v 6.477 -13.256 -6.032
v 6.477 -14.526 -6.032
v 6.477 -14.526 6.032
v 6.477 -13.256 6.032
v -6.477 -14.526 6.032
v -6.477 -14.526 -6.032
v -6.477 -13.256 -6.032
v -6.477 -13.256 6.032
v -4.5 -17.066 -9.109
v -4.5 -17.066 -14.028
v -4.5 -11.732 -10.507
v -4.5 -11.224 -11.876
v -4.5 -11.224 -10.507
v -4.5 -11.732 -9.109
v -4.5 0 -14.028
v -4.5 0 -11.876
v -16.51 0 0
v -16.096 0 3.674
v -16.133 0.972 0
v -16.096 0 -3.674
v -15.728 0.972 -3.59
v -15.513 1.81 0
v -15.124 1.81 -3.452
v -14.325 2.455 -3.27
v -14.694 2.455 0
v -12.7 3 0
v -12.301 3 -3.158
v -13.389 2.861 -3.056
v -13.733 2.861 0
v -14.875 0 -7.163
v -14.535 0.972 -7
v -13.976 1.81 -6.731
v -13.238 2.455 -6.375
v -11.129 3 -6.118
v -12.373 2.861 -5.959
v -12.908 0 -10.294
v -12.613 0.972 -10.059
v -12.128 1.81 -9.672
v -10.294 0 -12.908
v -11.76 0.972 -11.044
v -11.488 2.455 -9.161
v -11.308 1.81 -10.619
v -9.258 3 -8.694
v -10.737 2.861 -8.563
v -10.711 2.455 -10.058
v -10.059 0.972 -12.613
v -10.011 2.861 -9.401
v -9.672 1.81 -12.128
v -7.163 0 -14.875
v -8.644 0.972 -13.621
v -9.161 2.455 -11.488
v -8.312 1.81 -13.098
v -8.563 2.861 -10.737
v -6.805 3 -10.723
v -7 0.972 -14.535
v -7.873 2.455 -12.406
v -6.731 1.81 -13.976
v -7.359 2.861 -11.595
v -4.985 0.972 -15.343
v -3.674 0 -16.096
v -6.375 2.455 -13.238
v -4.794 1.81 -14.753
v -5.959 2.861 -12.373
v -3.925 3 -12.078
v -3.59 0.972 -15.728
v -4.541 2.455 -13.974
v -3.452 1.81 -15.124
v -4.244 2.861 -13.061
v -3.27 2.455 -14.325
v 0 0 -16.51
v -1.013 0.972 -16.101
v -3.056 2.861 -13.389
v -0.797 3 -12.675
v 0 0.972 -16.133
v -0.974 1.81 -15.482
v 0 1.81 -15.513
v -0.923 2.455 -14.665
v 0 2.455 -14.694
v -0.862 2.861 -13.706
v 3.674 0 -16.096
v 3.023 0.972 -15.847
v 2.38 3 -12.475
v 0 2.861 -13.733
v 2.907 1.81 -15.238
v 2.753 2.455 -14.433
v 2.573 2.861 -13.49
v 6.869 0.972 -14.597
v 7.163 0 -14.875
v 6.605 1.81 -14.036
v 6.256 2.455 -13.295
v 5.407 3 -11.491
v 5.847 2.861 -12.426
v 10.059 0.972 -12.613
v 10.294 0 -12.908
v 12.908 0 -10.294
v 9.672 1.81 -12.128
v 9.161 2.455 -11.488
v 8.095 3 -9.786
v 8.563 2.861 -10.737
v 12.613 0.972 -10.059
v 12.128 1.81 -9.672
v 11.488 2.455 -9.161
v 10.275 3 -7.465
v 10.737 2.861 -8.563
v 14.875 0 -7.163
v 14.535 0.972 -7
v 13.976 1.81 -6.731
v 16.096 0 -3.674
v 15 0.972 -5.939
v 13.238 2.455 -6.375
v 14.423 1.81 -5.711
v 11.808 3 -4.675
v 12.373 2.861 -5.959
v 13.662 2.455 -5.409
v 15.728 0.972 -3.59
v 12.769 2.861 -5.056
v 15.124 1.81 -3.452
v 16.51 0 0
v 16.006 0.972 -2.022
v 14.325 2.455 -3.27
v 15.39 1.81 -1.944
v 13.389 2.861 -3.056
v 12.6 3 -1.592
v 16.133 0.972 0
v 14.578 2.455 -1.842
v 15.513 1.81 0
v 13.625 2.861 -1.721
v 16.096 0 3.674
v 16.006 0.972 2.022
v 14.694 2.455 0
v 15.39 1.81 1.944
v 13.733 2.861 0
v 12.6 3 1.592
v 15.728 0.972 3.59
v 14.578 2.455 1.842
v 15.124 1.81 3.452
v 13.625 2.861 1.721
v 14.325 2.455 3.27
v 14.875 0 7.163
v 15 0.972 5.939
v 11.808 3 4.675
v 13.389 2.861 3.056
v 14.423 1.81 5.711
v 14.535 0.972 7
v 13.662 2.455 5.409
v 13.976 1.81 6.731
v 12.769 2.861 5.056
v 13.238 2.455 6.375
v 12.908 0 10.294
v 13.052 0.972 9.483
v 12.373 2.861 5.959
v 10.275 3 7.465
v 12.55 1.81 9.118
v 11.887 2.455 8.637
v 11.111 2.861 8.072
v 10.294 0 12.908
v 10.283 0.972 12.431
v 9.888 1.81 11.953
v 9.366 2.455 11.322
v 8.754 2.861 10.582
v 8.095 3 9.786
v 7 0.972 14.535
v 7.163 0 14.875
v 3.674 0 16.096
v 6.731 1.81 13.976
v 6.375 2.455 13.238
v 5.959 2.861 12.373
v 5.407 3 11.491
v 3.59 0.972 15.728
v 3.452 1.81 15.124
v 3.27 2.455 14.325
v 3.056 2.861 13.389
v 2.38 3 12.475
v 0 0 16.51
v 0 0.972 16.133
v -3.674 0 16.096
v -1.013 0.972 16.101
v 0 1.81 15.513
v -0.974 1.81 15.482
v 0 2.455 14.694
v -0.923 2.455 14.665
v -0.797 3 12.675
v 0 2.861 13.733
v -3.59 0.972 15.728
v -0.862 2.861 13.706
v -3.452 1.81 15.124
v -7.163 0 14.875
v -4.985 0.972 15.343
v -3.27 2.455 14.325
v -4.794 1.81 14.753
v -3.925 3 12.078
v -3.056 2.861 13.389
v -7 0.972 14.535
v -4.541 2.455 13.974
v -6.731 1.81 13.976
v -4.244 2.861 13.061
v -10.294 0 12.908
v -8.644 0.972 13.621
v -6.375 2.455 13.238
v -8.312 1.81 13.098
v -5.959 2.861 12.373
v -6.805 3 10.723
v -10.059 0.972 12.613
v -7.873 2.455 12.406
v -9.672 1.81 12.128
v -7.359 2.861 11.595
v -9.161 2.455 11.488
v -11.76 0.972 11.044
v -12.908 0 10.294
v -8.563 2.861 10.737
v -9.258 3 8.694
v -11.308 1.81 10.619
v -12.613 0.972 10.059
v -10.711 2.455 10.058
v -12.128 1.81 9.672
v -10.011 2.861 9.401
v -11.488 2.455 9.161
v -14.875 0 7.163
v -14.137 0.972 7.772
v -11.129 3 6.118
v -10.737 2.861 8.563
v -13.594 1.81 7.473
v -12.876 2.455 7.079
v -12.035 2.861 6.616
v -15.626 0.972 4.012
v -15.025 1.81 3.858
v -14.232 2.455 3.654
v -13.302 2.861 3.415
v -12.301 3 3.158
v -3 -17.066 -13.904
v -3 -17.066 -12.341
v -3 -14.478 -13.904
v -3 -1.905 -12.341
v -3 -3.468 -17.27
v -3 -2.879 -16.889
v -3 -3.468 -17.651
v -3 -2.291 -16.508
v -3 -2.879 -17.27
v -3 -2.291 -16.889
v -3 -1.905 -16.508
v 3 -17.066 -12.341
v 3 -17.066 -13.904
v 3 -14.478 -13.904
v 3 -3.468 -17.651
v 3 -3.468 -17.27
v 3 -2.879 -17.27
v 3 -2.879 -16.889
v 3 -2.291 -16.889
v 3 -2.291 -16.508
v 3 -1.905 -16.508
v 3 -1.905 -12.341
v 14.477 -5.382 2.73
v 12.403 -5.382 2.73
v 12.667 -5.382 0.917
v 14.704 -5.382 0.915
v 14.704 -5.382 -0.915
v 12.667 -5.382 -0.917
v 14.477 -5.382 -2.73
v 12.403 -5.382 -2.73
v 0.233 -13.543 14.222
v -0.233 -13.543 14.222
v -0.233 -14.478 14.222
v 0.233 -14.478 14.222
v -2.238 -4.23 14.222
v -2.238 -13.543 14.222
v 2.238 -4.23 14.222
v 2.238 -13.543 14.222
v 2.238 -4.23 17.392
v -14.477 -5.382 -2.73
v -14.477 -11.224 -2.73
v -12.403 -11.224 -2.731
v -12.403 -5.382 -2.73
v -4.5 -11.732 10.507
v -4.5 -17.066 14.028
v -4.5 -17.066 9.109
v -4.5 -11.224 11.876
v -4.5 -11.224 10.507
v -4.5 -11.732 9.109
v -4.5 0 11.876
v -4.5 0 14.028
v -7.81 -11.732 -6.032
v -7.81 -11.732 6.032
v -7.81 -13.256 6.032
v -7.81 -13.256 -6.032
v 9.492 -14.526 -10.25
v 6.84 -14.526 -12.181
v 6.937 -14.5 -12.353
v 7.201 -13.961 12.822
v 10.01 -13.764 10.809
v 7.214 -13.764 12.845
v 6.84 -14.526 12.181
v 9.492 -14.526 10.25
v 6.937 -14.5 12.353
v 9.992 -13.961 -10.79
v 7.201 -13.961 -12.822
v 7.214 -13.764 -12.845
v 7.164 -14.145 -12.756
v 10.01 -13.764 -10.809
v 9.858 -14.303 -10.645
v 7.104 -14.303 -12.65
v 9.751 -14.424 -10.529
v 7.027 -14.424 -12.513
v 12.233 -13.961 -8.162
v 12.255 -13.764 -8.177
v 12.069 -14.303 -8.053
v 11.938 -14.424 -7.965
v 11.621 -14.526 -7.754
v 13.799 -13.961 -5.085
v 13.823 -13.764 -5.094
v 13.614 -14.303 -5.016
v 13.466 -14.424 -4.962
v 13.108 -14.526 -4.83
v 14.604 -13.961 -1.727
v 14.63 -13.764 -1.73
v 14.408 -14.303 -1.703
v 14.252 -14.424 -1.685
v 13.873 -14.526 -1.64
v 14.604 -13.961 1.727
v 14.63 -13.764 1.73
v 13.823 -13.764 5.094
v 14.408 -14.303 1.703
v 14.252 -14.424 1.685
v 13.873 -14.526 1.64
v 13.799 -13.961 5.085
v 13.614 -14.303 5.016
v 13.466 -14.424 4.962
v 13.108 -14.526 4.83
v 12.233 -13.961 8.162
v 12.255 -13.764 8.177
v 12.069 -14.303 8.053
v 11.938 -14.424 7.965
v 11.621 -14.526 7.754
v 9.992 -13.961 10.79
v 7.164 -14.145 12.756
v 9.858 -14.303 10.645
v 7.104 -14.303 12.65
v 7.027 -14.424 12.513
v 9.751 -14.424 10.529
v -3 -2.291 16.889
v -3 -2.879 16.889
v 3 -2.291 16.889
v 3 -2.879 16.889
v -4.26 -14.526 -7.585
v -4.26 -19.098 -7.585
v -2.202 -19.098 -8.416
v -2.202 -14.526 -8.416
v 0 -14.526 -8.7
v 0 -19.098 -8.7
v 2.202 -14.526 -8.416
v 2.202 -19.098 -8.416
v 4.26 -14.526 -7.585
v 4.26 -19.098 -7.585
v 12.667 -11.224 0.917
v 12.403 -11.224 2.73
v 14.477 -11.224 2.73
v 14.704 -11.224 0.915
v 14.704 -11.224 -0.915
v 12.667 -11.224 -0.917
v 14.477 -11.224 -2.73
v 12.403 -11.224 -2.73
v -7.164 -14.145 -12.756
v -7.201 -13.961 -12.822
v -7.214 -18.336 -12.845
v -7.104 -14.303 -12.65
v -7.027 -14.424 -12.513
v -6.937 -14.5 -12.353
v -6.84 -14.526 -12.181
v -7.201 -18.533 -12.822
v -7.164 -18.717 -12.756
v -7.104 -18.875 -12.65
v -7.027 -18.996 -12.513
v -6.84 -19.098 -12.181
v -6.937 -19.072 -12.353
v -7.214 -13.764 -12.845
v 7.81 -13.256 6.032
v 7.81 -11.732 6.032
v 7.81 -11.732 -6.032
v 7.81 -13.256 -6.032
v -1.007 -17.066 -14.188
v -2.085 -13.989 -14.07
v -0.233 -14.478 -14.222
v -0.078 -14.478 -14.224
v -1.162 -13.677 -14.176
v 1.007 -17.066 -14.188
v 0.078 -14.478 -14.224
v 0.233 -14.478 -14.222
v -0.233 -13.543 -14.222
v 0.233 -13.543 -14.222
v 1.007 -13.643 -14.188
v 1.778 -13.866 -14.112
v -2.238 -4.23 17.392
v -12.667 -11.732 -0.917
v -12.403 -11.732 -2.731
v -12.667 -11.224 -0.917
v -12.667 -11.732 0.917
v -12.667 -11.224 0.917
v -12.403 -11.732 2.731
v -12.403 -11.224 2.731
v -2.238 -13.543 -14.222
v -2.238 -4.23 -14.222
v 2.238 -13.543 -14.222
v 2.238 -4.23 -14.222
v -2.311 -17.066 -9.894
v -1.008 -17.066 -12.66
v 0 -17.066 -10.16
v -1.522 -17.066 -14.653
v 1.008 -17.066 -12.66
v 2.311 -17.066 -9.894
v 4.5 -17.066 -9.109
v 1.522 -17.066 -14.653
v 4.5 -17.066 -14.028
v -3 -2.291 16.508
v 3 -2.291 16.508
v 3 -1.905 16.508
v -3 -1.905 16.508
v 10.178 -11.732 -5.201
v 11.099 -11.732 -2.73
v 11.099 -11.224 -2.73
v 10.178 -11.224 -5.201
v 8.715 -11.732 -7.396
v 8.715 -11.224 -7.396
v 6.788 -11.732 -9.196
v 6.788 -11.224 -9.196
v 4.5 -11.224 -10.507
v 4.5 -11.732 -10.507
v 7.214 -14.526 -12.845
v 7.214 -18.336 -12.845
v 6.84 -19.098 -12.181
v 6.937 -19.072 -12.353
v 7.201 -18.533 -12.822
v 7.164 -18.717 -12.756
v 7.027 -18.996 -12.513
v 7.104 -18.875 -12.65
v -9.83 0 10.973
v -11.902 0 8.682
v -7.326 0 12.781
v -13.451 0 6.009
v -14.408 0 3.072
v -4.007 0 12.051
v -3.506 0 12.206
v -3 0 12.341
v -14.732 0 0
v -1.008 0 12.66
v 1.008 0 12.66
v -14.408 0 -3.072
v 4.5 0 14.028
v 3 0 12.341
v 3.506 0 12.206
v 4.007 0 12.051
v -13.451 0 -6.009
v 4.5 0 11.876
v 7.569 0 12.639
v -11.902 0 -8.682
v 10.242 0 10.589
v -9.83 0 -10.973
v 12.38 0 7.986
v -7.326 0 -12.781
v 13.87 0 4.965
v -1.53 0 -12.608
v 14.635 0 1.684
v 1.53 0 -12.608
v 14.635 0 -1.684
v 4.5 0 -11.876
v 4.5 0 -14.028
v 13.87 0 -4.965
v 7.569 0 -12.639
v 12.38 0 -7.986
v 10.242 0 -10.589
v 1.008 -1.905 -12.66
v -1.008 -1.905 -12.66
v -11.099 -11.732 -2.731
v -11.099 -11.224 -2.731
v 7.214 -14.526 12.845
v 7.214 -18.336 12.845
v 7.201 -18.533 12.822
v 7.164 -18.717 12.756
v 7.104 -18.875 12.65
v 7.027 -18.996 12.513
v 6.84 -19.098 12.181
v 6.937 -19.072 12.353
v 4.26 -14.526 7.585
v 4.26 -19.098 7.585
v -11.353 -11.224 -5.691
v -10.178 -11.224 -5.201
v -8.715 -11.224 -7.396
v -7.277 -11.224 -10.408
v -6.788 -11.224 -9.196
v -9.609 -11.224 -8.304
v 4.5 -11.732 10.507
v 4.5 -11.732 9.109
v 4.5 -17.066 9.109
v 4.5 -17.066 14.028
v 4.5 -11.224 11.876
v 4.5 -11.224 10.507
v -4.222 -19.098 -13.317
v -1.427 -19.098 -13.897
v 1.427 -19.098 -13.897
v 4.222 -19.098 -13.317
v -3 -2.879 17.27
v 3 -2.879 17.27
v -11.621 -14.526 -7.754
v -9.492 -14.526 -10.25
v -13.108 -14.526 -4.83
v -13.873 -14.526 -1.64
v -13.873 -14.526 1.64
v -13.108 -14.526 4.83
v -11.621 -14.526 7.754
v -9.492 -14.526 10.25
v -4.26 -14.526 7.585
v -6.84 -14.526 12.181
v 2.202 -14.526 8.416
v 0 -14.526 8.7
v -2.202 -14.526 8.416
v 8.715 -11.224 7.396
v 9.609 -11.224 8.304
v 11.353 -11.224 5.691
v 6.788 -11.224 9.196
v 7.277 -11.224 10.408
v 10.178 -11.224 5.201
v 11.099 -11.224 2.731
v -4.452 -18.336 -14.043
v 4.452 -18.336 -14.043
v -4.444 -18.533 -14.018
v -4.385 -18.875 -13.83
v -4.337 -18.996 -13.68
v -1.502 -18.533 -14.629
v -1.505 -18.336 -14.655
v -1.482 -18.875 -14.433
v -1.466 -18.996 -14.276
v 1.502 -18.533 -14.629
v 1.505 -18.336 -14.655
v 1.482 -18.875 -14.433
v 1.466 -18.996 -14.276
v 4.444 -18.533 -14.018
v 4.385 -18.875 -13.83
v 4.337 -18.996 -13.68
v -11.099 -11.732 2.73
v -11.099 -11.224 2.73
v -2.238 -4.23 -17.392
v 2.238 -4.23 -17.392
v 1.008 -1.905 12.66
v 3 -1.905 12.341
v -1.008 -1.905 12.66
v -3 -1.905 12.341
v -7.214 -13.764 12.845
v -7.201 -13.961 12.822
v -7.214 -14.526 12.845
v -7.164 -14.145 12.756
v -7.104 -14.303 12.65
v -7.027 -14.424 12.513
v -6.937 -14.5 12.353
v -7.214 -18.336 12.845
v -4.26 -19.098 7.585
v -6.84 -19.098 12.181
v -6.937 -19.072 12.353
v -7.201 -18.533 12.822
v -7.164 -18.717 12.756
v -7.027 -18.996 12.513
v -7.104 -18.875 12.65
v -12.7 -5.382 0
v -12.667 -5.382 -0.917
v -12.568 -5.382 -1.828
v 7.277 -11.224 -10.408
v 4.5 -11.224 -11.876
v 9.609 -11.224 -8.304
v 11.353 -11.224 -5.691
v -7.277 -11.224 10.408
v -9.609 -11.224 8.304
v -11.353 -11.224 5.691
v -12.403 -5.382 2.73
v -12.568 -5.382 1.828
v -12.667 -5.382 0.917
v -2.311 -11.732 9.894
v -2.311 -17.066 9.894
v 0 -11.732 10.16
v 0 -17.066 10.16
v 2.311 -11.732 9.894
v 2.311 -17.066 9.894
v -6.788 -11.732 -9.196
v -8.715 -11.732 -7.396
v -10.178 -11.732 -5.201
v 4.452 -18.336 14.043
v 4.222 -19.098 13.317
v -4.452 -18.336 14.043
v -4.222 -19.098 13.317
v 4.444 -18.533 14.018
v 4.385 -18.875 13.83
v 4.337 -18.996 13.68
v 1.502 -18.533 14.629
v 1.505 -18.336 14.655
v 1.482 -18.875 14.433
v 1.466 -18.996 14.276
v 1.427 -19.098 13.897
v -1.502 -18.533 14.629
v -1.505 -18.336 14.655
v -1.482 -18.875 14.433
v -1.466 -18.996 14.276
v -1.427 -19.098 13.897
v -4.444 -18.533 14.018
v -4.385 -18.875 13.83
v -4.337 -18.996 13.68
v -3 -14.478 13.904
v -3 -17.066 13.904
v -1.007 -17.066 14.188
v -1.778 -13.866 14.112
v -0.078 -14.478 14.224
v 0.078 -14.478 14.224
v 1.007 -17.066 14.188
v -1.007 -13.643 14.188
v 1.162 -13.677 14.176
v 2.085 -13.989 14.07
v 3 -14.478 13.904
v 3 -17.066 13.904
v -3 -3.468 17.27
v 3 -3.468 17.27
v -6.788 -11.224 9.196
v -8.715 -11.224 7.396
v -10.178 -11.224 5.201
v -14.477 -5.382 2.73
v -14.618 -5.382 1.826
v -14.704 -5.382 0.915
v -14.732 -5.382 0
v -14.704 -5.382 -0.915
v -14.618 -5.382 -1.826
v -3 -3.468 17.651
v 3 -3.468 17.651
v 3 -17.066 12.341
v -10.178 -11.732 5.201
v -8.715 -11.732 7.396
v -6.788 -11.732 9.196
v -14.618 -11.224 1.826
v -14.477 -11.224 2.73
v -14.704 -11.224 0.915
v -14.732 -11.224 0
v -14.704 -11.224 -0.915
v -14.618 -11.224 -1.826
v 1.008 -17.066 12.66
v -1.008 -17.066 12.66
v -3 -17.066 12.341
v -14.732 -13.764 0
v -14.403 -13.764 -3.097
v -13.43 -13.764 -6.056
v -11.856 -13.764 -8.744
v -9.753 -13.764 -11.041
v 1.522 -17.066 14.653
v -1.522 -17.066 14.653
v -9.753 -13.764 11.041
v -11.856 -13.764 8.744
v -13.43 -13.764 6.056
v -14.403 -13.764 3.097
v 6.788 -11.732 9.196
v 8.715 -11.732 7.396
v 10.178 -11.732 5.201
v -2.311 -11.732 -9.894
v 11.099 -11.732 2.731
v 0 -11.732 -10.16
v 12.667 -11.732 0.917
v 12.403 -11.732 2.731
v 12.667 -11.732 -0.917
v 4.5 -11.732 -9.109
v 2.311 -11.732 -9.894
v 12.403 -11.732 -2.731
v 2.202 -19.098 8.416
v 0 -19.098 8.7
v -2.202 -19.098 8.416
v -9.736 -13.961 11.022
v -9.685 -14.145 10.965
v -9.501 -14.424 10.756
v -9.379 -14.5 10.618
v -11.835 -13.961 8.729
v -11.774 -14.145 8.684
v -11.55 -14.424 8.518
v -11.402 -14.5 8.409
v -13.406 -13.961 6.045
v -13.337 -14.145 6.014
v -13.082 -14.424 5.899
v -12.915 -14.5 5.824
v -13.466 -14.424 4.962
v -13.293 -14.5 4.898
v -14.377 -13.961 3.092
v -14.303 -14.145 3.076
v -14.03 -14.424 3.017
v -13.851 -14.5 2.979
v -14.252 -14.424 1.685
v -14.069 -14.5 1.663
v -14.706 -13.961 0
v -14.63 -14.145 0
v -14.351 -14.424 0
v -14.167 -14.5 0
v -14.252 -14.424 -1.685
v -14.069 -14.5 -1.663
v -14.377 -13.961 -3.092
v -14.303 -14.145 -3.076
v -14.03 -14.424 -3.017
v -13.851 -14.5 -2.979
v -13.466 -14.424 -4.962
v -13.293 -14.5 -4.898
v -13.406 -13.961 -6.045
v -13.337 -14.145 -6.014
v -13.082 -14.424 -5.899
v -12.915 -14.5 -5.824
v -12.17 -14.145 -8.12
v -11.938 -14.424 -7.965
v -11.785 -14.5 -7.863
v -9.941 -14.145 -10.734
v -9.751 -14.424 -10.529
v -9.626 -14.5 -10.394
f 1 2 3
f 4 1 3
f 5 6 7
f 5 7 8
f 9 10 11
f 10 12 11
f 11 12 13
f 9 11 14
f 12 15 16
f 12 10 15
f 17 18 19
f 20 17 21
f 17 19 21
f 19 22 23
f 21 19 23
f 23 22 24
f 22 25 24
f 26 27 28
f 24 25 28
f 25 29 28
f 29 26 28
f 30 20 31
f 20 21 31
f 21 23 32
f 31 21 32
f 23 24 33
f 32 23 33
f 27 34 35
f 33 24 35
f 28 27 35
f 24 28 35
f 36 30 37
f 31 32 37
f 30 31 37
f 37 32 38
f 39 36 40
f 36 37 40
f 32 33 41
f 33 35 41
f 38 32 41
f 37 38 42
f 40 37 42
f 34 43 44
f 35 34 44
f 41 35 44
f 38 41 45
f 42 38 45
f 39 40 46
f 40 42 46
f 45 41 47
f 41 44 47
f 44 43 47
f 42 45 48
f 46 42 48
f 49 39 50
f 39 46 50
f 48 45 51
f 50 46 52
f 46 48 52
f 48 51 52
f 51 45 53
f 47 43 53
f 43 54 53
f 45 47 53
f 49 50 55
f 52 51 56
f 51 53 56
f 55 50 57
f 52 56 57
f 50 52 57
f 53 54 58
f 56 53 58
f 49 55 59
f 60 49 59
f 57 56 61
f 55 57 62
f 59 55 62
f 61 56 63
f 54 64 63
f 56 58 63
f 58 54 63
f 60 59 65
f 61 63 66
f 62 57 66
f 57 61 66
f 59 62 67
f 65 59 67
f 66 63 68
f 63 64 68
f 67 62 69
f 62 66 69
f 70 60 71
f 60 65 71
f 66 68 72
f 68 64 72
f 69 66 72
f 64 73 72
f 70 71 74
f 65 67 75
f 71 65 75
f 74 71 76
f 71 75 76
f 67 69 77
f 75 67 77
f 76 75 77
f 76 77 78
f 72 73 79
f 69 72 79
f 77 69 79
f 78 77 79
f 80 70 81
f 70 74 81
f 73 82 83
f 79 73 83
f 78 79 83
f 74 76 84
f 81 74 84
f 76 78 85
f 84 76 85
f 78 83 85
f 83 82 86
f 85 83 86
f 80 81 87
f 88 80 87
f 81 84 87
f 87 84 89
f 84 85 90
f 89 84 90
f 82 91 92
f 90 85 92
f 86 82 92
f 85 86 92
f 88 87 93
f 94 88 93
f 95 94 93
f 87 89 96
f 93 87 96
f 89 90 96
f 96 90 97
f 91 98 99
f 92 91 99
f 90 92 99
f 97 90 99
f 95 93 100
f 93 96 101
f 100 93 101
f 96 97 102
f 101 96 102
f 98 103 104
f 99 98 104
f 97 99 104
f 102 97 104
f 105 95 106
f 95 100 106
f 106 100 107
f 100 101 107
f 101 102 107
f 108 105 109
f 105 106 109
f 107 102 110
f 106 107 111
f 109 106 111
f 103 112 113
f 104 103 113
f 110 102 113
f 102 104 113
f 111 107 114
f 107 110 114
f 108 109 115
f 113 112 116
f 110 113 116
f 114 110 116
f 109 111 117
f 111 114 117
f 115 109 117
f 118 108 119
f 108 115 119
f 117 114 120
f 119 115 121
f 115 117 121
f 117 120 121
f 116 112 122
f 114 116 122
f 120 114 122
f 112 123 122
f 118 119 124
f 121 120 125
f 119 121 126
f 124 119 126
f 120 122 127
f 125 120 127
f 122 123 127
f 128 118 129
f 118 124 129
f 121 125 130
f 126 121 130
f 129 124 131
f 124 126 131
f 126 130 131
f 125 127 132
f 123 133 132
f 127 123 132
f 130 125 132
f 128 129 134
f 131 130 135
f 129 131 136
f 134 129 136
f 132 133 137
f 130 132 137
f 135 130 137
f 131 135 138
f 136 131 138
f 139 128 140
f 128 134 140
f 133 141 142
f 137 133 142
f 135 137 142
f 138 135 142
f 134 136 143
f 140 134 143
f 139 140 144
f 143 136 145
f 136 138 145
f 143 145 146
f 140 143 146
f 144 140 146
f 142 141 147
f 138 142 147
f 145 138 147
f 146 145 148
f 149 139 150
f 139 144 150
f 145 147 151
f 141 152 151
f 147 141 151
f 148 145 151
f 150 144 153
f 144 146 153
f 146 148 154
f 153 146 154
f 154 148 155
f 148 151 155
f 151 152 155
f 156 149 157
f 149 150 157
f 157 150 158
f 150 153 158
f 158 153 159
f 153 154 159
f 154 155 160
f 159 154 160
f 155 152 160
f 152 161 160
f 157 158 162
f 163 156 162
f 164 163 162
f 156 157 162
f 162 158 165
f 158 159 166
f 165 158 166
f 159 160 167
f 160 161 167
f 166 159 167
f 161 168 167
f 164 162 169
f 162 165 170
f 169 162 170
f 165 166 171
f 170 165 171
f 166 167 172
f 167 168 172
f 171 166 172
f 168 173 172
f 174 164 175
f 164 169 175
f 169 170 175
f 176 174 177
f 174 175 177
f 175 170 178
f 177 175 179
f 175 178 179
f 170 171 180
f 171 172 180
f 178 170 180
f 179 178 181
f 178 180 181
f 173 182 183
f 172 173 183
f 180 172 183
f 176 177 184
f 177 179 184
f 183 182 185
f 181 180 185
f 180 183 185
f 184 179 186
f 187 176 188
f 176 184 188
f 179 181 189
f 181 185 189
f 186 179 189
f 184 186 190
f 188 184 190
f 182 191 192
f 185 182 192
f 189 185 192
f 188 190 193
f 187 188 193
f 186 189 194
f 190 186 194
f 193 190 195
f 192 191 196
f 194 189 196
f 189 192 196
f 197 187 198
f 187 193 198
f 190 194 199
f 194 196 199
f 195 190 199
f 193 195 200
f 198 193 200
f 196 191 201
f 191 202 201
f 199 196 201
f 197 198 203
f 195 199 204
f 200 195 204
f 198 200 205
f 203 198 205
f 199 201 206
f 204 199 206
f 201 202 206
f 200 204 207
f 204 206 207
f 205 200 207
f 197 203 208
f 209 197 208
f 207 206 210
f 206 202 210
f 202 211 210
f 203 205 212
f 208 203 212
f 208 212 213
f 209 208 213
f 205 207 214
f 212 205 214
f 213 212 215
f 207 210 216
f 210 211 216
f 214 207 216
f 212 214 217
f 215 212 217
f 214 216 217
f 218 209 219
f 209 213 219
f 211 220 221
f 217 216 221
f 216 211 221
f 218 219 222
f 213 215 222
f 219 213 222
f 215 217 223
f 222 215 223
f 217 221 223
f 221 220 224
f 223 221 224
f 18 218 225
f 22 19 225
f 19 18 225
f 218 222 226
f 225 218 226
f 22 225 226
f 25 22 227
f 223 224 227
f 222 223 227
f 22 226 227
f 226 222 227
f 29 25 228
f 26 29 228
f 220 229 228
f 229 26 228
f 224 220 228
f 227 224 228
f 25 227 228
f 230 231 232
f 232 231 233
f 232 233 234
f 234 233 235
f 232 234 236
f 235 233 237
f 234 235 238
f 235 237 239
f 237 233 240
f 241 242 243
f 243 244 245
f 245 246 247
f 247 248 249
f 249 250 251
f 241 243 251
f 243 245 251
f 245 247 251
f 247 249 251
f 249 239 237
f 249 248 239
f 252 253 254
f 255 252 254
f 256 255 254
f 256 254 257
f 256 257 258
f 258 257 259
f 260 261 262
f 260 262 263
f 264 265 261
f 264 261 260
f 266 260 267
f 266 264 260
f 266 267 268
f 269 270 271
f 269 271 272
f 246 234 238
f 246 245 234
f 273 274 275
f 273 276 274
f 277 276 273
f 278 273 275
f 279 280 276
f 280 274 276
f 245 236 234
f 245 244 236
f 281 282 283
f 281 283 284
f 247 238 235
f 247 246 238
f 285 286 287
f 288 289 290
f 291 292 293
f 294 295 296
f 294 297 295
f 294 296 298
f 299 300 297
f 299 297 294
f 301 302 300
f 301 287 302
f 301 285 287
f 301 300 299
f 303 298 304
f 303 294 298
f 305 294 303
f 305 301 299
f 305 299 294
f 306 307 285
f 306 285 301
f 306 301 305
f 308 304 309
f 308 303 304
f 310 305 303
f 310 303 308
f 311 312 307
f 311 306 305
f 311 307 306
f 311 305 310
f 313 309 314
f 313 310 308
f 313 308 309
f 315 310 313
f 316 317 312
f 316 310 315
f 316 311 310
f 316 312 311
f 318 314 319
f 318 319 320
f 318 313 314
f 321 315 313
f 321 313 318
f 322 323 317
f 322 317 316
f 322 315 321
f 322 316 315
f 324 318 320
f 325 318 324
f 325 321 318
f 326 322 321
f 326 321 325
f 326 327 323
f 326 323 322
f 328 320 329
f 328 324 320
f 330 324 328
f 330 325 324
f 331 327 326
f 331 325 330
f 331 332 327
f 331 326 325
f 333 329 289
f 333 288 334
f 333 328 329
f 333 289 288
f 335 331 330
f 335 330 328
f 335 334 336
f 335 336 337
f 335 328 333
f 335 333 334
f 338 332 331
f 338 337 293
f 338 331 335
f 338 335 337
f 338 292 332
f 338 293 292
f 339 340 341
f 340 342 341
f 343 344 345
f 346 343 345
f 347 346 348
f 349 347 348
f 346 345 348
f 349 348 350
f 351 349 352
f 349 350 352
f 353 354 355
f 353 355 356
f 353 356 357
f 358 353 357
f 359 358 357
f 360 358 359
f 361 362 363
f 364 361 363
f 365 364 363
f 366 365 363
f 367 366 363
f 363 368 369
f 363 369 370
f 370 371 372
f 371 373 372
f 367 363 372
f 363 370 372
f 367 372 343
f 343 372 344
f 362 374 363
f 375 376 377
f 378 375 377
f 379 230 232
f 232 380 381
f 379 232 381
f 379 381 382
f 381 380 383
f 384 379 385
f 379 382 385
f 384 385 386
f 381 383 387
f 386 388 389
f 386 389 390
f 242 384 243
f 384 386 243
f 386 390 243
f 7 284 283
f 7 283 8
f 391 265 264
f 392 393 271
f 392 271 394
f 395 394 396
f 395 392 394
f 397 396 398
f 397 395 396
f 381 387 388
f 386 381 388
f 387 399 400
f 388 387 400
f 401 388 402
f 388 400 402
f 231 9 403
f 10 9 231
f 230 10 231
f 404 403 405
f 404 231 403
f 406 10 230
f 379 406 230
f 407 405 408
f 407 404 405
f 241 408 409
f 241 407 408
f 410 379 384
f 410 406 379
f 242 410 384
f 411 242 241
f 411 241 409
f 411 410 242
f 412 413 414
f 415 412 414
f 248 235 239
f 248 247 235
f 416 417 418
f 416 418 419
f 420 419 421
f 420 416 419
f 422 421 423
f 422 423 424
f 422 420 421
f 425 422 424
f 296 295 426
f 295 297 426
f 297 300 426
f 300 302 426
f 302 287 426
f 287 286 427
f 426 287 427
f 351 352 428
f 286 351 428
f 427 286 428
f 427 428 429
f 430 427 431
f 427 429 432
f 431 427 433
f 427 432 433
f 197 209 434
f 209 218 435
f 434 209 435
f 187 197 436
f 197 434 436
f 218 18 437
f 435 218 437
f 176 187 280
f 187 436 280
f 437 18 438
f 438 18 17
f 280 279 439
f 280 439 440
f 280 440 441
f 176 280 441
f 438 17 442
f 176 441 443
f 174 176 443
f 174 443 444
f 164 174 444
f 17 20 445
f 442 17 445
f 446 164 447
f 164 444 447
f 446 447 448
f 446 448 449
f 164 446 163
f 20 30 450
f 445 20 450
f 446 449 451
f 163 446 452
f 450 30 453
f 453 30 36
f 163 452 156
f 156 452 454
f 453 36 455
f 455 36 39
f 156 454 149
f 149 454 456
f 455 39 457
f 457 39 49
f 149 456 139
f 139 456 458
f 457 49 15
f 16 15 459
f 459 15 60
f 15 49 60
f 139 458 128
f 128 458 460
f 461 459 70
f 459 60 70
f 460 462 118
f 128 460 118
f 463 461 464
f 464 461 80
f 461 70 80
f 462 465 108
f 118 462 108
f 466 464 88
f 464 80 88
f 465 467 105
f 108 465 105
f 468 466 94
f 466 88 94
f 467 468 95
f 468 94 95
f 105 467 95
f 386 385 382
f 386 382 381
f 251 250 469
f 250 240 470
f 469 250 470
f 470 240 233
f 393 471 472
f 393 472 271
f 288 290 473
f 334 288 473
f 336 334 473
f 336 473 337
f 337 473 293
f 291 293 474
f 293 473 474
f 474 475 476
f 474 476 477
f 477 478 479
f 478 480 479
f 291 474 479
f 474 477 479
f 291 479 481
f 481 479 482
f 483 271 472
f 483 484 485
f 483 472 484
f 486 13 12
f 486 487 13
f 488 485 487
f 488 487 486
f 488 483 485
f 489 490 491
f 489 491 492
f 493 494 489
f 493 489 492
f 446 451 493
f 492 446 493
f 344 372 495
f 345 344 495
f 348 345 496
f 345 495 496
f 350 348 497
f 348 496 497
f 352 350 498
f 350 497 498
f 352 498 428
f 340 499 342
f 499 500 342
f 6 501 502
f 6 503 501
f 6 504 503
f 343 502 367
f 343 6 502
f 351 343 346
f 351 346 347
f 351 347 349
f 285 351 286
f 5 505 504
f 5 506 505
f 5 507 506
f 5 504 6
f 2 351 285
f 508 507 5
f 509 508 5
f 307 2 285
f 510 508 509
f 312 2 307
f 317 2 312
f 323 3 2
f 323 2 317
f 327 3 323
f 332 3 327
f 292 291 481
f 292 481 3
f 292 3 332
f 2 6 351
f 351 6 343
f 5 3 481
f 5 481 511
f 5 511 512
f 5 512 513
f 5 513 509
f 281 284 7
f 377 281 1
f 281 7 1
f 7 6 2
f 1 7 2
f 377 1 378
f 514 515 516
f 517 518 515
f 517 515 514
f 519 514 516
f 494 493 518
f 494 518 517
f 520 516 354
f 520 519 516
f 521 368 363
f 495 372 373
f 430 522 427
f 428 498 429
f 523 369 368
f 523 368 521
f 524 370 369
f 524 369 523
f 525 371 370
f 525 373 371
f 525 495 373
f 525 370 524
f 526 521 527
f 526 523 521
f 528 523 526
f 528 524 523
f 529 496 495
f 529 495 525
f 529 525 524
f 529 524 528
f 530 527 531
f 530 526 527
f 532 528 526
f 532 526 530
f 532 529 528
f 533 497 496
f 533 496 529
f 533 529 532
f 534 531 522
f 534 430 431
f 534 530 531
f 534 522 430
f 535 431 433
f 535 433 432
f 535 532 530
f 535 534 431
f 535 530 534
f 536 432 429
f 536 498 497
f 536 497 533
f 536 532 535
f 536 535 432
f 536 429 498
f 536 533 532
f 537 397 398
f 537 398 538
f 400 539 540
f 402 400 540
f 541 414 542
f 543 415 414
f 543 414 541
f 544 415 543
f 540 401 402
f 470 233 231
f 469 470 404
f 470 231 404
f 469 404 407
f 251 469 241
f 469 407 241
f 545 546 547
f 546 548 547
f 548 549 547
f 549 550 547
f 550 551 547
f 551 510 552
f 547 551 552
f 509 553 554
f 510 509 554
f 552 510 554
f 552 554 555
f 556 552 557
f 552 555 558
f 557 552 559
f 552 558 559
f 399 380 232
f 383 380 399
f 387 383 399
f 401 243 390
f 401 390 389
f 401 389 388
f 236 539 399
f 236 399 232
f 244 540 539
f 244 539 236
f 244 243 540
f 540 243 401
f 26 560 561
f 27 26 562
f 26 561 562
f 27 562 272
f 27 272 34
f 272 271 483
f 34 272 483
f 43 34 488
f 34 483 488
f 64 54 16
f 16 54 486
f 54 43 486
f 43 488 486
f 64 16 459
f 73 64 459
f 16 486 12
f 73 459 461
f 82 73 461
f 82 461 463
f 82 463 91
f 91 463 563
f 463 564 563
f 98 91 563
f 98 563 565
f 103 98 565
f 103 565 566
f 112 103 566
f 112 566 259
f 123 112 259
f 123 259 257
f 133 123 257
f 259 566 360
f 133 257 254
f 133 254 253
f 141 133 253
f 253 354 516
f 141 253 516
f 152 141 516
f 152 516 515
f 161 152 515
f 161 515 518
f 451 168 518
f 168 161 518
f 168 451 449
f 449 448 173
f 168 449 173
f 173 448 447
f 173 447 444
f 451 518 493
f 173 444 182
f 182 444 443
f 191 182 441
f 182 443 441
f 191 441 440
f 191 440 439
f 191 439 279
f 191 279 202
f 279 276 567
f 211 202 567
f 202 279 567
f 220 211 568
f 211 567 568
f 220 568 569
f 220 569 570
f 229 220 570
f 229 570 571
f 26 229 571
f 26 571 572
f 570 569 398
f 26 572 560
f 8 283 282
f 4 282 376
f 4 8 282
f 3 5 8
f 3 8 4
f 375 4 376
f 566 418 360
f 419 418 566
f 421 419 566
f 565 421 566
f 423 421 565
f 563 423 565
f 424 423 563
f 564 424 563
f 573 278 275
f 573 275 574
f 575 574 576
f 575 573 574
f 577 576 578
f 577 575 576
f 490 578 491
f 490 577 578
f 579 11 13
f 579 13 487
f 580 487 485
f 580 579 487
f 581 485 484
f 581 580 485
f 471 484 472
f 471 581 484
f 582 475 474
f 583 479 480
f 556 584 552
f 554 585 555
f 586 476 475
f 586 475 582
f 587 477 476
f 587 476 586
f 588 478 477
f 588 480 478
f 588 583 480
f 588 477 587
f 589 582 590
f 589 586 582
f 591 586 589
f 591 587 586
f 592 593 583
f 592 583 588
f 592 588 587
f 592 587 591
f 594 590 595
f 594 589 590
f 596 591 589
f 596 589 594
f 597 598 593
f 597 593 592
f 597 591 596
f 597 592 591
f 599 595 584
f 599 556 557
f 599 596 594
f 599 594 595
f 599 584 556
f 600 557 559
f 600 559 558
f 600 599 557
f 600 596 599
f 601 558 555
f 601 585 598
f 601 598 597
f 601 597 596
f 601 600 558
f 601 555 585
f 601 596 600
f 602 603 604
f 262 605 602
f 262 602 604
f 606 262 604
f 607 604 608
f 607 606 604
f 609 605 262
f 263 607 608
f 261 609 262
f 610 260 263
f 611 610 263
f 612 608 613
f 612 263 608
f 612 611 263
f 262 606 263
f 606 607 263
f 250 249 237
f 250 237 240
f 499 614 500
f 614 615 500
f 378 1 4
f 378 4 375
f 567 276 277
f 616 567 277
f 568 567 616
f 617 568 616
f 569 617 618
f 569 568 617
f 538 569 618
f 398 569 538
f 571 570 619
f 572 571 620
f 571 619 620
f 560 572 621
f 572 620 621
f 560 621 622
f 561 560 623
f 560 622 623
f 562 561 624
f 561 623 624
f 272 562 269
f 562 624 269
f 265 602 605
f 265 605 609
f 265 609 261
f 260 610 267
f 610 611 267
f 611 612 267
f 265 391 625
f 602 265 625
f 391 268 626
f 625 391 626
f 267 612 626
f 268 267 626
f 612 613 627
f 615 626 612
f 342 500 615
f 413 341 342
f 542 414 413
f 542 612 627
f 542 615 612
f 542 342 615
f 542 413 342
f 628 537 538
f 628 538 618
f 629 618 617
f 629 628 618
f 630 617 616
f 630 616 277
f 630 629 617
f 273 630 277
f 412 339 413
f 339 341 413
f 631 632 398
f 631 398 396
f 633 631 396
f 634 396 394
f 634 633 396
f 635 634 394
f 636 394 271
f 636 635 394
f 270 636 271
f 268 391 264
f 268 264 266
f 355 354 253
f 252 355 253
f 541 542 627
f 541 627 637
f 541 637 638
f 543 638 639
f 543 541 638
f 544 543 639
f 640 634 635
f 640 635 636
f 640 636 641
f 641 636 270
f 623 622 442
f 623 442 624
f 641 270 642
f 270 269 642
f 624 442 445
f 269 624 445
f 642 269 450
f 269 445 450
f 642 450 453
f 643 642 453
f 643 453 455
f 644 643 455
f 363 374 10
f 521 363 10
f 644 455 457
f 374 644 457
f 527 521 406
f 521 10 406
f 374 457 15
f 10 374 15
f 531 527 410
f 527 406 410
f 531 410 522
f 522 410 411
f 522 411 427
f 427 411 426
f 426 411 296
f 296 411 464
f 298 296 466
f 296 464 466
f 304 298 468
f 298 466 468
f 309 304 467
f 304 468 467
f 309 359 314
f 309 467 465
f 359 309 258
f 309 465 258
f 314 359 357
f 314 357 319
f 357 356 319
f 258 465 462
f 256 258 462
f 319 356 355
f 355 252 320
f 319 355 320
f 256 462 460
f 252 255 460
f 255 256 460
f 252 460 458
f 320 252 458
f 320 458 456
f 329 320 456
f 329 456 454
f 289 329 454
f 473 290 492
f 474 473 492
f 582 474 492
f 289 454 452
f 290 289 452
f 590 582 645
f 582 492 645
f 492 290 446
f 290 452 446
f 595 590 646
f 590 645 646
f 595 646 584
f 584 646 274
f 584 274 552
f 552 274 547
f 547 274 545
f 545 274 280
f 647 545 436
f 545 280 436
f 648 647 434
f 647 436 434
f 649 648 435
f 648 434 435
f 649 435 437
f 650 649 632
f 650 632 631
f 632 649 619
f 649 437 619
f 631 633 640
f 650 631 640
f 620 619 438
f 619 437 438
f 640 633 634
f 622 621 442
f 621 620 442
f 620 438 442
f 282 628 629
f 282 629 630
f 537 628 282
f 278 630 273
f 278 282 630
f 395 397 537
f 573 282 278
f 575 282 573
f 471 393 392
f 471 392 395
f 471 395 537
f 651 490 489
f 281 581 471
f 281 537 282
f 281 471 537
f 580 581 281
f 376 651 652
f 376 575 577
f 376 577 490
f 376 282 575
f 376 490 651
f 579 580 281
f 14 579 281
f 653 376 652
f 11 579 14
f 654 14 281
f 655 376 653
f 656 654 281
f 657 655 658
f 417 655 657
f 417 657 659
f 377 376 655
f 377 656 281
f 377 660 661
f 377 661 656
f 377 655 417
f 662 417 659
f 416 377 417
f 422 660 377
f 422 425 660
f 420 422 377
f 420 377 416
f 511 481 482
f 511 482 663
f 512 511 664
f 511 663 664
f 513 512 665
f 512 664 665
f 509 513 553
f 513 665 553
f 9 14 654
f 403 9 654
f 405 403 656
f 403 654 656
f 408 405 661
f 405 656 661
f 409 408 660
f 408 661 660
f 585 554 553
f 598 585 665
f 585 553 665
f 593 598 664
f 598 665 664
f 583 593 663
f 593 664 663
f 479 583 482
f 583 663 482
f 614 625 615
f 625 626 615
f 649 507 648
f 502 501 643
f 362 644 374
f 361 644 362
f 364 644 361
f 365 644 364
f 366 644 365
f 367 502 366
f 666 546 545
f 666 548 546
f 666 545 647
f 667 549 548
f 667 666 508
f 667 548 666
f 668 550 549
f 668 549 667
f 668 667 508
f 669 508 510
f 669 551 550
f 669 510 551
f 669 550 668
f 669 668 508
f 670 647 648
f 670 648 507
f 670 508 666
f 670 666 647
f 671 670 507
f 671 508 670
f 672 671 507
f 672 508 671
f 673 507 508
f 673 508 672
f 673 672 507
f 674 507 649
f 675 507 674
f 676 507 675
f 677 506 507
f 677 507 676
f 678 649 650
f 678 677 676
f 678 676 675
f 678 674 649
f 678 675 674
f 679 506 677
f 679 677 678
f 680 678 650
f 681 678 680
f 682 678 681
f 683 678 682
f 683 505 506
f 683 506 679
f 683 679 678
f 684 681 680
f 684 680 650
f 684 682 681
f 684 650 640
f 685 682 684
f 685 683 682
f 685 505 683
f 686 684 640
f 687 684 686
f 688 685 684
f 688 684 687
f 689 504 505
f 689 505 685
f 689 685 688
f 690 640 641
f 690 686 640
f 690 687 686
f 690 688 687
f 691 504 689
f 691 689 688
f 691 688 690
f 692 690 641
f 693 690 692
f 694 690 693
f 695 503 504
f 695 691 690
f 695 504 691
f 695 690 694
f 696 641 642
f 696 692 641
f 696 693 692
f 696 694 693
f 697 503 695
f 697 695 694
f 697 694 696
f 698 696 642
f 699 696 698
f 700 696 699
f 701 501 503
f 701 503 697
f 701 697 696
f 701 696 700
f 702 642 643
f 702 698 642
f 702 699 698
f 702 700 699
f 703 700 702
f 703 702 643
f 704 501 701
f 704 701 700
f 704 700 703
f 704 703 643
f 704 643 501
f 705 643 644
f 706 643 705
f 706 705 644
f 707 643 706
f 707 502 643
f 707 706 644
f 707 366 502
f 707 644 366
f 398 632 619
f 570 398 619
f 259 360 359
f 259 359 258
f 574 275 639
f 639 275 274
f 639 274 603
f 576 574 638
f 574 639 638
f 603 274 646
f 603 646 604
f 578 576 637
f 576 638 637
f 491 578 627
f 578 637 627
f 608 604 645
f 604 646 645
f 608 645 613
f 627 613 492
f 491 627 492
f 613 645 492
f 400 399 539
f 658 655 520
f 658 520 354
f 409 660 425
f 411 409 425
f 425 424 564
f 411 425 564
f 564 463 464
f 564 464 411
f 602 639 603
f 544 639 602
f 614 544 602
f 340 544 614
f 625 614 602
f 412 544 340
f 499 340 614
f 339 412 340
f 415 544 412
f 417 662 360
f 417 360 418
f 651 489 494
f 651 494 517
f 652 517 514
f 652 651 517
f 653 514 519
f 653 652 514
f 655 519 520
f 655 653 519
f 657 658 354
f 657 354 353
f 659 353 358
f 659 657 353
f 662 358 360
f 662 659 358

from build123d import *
from build123d.topology import SkipClean

# Parameters (mm, degrees)
FEET_DEPTH            = 4.572
SWITCH_HOLE_REACH     = 31.195
SKETCH2_W             = 12.954
SKETCH2_H             = 12.065
SQUARE_DEPTH          = 31.164446025
SQUARE_DEPTH_BACK     = 31.164446025
SKETCH6_W             = 5.461
SKETCH6_H             = 5.842
EXTRUDE3_START        = -0.508
SKETCH4_W             = 12.954
SKETCH4_H             = 12.065
EXTRUDE3_DEPTH        = 0.508
SKETCH5_W             = 15.621
SKETCH5_H             = 12.065
SWITCH_HOLE2_DEPTH    = 1.524
TAB_CIRC_CUTOUT_DEPTH = 17.066
TAB_START             = -6
TAB_TOP_OUTLINE_W     = 2.54
TAB_TOP_OUTLINE_H     = 1.905
TAB_TOP_DEPTH         = 6
TAB_WEDGE_DEPTH       = 3
SKETCH11_W            = 4.476
SKETCH11_H            = 10.247840718
CUT_TAB_DEPTH         = 3.556
FILLET1_R             = 0.762


# Read off the part's stored shape, not the designer's step: tab circ cutout, tab top
with BuildPart() as part:
    # Sketch1 → Revolve1 (revolve)
    with BuildSketch(Plane.XY, mode=Mode.PRIVATE) as revolve1_sk:
        with BuildLine():
            Line((14.732, 0), (16.51, 0))
            ThreePointArc((16.51, 0), (15.124670081, 2.159981002), (12.7, 3))
            Line((12.7, 3), (12.7, -11.224))
            Line((12.7, -11.224), (0, -11.224))
            Line((0, -11.224), (0, -14.526))
            Line((0, -14.526), (8.6995, -14.526))
            Line((8.6995, -14.526), (8.6995, -19.098))
            Line((8.6995, -19.098), (14.732, -19.098))
            Line((14.732, -19.098), (14.732, 0))
        make_face()
    revolve(revolve1_sk.sketch.rotate(Axis((0, 3, 0), (0, -1, 0)), 180), axis=Axis((0, 3, 0), (0, -1, 0)))

    # Sketch3 → feet (cut)
    with BuildSketch(Plane.XZ.offset(19.098)):
        with BuildLine():
            ThreePointArc((-7.2136, 12.845069055), (-14.732, 0), (-7.2136, -12.845069055))
            Line((-7.2136, -12.845069055), (-4.259755172, -7.585234744))
            ThreePointArc((-4.259755172, -7.585234744), (-8.6995, 0), (-4.259755172, 7.585234744))
            Line((-4.259755172, 7.585234744), (-7.2136, 12.845069055))
        make_face()
        with BuildLine():
            Line((4.259755172, -7.585234744), (7.2136, -12.845069055))
            ThreePointArc((7.2136, -12.845069055), (14.732, 0), (7.2136, 12.845069055))
            Line((7.2136, 12.845069055), (4.259755172, 7.585234744))
            ThreePointArc((4.259755172, 7.585234744), (8.6995, 0), (4.259755172, -7.585234744))
        make_face()
    extrude(amount=-FEET_DEPTH, mode=Mode.SUBTRACT)

    # Sketch2 → switch hole (cut, up to next)
    with BuildSketch(Plane.XZ.offset(14.526), mode=Mode.PRIVATE) as switch_hole_sk1:
        Rectangle(SKETCH2_W, SKETCH2_H)
    switch_hole_tool1 = extrude(switch_hole_sk1.sketch, amount=-SWITCH_HOLE_REACH, mode=Mode.PRIVATE) & part.part
    add(switch_hole_tool1.solids().sort_by_distance((0, -14.526, 0))[0], mode=Mode.SUBTRACT)

    # Sketch6 → square (cut, two sides: drawn at the far end of the back side and taken through both)
    with BuildSketch(Plane(origin=(0, 0, 0), x_dir=(0, 0, -1), z_dir=(1, 0, 0)).offset(-SQUARE_DEPTH_BACK)):
        with Locations((0, -8.303)):
            Rectangle(SKETCH6_W, SKETCH6_H)
    extrude(amount=SQUARE_DEPTH + SQUARE_DEPTH_BACK, mode=Mode.SUBTRACT)

    # Sketch4 → Extrude3 (cut)
    with BuildSketch(Plane(origin=(0, -11.224, 0), x_dir=(1, 0, 0), z_dir=(0, 1, 0)).offset(EXTRUDE3_START)):
        with BuildLine():
            Line((11.099066166, -2.7305), (12.402998418, -2.7305))
            ThreePointArc((12.402998418, -2.7305), (12.7, 0), (12.402998418, 2.7305))
            Line((12.402998418, 2.7305), (11.099066166, 2.7305))
            ThreePointArc((11.099066166, 2.7305), (0, 11.43), (-11.099066166, 2.7305))
            Line((-11.099066166, 2.7305), (-12.402998418, 2.7305))
            ThreePointArc((-12.402998418, 2.7305), (-12.7, 0), (-12.402998418, -2.7305))
            Line((-12.402998418, -2.7305), (-11.099066166, -2.7305))
            ThreePointArc((-11.099066166, -2.7305), (0, -11.43), (11.099066166, -2.7305))
        make_face()
        Rectangle(SKETCH4_W, SKETCH4_H, mode=Mode.SUBTRACT)
    extrude(amount=EXTRUDE3_DEPTH, mode=Mode.SUBTRACT)

    # Sketch5 → switch hole2 (cut)
    with BuildSketch(Plane(origin=(0, -11.732, 0), x_dir=(1, 0, 0), z_dir=(0, 1, 0))):
        Rectangle(SKETCH5_W, SKETCH5_H)
    extrude(amount=-SWITCH_HOLE2_DEPTH, mode=Mode.SUBTRACT)

    # tab circ cutout outline → tab circ cutout (cut)
    with BuildSketch(Plane.XZ):
        with BuildLine():
            ThreePointArc((-4.5, 9.109094357), (0, 10.16), (4.5, 9.109094357))
            Line((4.5, 9.109094357), (4.5, 14.027894496))
            ThreePointArc((4.5, 14.027894496), (0, 14.732), (-4.5, 14.027894496))
            Line((-4.5, 14.027894496), (-4.5, 9.109094357))
        make_face()
        with BuildLine():
            ThreePointArc((3, 12.340583455), (0, 12.7), (-3, 12.340583455))
            Line((-3, 12.340583455), (-3, 13.904034522))
            ThreePointArc((-3, 13.904034522), (0, 14.224), (3, 13.904034522))
            Line((3, 13.904034522), (3, 12.340583455))
        make_face(mode=Mode.SUBTRACT)
    tab_circ_cutout = extrude(amount=TAB_CIRC_CUTOUT_DEPTH, mode=Mode.SUBTRACT)

    # tab top outline → tab top (cut)
    with SkipClean():  # the faces are left unmerged after this step: merging them gives an invalid solid
        with BuildSketch(Plane(origin=(3, 0, 0), x_dir=(0, 0, -1), z_dir=(1, 0, 0)).offset(TAB_START)):
            with Locations((-13.610583455, -0.9525)):
                Rectangle(TAB_TOP_OUTLINE_W, TAB_TOP_OUTLINE_H)
        tab_top = extrude(amount=TAB_TOP_DEPTH, mode=Mode.SUBTRACT)
    add(part.part.scale(1), mode=Mode.REPLACE)  # the faces are merged on a copy

    # Sketch10 → tab wedge (add, symmetric)
    with BuildSketch(Plane(origin=(0, 0, 0), x_dir=(0, 0, -1), z_dir=(1, 0, 0))):
        Polygon((-13.904034522, -1.905), (-13.904034522, -14.478), (-17.651091727, -3.468159282), (-17.270091727, -3.468159282), (-17.270091727, -2.879362986), (-16.889091727, -2.879362986), (-16.889091727, -2.290566689), (-16.508091727, -2.290566689), (-16.508091727, -1.905), align=None)
    tab_wedge = extrude(amount=TAB_WEDGE_DEPTH, both=True)

    # Sketch11 → cut tab (cut)
    with BuildSketch(Plane.XY.offset(17.778091727)):
        with Locations((0, -9.354079641)):
            Rectangle(SKETCH11_W, SKETCH11_H)
    cut_tab = extrude(amount=-CUT_TAB_DEPTH, mode=Mode.SUBTRACT)

    # tab mirror: tab circ cutout, tab top, tab wedge, cut tab across plane
    add(tab_circ_cutout.mirror(Plane.XY), mode=Mode.SUBTRACT)
    add(tab_top.mirror(Plane.XY), mode=Mode.SUBTRACT)
    add(tab_wedge.mirror(Plane.XY))
    add(cut_tab.mirror(Plane.XY), mode=Mode.SUBTRACT)

    # Fillet1
    fillet1_edges = [part.edges().sort_by_distance(p)[0] for p in [
        (0, -19.098, -14.732),
        (14.732, -14.526, 0),
        (0, -19.098, 14.732),
        (-12.714216043, -14.526, -7.441809887),
    ]]
    fillet(fillet1_edges, radius=FILLET1_R)


solid = part.part
